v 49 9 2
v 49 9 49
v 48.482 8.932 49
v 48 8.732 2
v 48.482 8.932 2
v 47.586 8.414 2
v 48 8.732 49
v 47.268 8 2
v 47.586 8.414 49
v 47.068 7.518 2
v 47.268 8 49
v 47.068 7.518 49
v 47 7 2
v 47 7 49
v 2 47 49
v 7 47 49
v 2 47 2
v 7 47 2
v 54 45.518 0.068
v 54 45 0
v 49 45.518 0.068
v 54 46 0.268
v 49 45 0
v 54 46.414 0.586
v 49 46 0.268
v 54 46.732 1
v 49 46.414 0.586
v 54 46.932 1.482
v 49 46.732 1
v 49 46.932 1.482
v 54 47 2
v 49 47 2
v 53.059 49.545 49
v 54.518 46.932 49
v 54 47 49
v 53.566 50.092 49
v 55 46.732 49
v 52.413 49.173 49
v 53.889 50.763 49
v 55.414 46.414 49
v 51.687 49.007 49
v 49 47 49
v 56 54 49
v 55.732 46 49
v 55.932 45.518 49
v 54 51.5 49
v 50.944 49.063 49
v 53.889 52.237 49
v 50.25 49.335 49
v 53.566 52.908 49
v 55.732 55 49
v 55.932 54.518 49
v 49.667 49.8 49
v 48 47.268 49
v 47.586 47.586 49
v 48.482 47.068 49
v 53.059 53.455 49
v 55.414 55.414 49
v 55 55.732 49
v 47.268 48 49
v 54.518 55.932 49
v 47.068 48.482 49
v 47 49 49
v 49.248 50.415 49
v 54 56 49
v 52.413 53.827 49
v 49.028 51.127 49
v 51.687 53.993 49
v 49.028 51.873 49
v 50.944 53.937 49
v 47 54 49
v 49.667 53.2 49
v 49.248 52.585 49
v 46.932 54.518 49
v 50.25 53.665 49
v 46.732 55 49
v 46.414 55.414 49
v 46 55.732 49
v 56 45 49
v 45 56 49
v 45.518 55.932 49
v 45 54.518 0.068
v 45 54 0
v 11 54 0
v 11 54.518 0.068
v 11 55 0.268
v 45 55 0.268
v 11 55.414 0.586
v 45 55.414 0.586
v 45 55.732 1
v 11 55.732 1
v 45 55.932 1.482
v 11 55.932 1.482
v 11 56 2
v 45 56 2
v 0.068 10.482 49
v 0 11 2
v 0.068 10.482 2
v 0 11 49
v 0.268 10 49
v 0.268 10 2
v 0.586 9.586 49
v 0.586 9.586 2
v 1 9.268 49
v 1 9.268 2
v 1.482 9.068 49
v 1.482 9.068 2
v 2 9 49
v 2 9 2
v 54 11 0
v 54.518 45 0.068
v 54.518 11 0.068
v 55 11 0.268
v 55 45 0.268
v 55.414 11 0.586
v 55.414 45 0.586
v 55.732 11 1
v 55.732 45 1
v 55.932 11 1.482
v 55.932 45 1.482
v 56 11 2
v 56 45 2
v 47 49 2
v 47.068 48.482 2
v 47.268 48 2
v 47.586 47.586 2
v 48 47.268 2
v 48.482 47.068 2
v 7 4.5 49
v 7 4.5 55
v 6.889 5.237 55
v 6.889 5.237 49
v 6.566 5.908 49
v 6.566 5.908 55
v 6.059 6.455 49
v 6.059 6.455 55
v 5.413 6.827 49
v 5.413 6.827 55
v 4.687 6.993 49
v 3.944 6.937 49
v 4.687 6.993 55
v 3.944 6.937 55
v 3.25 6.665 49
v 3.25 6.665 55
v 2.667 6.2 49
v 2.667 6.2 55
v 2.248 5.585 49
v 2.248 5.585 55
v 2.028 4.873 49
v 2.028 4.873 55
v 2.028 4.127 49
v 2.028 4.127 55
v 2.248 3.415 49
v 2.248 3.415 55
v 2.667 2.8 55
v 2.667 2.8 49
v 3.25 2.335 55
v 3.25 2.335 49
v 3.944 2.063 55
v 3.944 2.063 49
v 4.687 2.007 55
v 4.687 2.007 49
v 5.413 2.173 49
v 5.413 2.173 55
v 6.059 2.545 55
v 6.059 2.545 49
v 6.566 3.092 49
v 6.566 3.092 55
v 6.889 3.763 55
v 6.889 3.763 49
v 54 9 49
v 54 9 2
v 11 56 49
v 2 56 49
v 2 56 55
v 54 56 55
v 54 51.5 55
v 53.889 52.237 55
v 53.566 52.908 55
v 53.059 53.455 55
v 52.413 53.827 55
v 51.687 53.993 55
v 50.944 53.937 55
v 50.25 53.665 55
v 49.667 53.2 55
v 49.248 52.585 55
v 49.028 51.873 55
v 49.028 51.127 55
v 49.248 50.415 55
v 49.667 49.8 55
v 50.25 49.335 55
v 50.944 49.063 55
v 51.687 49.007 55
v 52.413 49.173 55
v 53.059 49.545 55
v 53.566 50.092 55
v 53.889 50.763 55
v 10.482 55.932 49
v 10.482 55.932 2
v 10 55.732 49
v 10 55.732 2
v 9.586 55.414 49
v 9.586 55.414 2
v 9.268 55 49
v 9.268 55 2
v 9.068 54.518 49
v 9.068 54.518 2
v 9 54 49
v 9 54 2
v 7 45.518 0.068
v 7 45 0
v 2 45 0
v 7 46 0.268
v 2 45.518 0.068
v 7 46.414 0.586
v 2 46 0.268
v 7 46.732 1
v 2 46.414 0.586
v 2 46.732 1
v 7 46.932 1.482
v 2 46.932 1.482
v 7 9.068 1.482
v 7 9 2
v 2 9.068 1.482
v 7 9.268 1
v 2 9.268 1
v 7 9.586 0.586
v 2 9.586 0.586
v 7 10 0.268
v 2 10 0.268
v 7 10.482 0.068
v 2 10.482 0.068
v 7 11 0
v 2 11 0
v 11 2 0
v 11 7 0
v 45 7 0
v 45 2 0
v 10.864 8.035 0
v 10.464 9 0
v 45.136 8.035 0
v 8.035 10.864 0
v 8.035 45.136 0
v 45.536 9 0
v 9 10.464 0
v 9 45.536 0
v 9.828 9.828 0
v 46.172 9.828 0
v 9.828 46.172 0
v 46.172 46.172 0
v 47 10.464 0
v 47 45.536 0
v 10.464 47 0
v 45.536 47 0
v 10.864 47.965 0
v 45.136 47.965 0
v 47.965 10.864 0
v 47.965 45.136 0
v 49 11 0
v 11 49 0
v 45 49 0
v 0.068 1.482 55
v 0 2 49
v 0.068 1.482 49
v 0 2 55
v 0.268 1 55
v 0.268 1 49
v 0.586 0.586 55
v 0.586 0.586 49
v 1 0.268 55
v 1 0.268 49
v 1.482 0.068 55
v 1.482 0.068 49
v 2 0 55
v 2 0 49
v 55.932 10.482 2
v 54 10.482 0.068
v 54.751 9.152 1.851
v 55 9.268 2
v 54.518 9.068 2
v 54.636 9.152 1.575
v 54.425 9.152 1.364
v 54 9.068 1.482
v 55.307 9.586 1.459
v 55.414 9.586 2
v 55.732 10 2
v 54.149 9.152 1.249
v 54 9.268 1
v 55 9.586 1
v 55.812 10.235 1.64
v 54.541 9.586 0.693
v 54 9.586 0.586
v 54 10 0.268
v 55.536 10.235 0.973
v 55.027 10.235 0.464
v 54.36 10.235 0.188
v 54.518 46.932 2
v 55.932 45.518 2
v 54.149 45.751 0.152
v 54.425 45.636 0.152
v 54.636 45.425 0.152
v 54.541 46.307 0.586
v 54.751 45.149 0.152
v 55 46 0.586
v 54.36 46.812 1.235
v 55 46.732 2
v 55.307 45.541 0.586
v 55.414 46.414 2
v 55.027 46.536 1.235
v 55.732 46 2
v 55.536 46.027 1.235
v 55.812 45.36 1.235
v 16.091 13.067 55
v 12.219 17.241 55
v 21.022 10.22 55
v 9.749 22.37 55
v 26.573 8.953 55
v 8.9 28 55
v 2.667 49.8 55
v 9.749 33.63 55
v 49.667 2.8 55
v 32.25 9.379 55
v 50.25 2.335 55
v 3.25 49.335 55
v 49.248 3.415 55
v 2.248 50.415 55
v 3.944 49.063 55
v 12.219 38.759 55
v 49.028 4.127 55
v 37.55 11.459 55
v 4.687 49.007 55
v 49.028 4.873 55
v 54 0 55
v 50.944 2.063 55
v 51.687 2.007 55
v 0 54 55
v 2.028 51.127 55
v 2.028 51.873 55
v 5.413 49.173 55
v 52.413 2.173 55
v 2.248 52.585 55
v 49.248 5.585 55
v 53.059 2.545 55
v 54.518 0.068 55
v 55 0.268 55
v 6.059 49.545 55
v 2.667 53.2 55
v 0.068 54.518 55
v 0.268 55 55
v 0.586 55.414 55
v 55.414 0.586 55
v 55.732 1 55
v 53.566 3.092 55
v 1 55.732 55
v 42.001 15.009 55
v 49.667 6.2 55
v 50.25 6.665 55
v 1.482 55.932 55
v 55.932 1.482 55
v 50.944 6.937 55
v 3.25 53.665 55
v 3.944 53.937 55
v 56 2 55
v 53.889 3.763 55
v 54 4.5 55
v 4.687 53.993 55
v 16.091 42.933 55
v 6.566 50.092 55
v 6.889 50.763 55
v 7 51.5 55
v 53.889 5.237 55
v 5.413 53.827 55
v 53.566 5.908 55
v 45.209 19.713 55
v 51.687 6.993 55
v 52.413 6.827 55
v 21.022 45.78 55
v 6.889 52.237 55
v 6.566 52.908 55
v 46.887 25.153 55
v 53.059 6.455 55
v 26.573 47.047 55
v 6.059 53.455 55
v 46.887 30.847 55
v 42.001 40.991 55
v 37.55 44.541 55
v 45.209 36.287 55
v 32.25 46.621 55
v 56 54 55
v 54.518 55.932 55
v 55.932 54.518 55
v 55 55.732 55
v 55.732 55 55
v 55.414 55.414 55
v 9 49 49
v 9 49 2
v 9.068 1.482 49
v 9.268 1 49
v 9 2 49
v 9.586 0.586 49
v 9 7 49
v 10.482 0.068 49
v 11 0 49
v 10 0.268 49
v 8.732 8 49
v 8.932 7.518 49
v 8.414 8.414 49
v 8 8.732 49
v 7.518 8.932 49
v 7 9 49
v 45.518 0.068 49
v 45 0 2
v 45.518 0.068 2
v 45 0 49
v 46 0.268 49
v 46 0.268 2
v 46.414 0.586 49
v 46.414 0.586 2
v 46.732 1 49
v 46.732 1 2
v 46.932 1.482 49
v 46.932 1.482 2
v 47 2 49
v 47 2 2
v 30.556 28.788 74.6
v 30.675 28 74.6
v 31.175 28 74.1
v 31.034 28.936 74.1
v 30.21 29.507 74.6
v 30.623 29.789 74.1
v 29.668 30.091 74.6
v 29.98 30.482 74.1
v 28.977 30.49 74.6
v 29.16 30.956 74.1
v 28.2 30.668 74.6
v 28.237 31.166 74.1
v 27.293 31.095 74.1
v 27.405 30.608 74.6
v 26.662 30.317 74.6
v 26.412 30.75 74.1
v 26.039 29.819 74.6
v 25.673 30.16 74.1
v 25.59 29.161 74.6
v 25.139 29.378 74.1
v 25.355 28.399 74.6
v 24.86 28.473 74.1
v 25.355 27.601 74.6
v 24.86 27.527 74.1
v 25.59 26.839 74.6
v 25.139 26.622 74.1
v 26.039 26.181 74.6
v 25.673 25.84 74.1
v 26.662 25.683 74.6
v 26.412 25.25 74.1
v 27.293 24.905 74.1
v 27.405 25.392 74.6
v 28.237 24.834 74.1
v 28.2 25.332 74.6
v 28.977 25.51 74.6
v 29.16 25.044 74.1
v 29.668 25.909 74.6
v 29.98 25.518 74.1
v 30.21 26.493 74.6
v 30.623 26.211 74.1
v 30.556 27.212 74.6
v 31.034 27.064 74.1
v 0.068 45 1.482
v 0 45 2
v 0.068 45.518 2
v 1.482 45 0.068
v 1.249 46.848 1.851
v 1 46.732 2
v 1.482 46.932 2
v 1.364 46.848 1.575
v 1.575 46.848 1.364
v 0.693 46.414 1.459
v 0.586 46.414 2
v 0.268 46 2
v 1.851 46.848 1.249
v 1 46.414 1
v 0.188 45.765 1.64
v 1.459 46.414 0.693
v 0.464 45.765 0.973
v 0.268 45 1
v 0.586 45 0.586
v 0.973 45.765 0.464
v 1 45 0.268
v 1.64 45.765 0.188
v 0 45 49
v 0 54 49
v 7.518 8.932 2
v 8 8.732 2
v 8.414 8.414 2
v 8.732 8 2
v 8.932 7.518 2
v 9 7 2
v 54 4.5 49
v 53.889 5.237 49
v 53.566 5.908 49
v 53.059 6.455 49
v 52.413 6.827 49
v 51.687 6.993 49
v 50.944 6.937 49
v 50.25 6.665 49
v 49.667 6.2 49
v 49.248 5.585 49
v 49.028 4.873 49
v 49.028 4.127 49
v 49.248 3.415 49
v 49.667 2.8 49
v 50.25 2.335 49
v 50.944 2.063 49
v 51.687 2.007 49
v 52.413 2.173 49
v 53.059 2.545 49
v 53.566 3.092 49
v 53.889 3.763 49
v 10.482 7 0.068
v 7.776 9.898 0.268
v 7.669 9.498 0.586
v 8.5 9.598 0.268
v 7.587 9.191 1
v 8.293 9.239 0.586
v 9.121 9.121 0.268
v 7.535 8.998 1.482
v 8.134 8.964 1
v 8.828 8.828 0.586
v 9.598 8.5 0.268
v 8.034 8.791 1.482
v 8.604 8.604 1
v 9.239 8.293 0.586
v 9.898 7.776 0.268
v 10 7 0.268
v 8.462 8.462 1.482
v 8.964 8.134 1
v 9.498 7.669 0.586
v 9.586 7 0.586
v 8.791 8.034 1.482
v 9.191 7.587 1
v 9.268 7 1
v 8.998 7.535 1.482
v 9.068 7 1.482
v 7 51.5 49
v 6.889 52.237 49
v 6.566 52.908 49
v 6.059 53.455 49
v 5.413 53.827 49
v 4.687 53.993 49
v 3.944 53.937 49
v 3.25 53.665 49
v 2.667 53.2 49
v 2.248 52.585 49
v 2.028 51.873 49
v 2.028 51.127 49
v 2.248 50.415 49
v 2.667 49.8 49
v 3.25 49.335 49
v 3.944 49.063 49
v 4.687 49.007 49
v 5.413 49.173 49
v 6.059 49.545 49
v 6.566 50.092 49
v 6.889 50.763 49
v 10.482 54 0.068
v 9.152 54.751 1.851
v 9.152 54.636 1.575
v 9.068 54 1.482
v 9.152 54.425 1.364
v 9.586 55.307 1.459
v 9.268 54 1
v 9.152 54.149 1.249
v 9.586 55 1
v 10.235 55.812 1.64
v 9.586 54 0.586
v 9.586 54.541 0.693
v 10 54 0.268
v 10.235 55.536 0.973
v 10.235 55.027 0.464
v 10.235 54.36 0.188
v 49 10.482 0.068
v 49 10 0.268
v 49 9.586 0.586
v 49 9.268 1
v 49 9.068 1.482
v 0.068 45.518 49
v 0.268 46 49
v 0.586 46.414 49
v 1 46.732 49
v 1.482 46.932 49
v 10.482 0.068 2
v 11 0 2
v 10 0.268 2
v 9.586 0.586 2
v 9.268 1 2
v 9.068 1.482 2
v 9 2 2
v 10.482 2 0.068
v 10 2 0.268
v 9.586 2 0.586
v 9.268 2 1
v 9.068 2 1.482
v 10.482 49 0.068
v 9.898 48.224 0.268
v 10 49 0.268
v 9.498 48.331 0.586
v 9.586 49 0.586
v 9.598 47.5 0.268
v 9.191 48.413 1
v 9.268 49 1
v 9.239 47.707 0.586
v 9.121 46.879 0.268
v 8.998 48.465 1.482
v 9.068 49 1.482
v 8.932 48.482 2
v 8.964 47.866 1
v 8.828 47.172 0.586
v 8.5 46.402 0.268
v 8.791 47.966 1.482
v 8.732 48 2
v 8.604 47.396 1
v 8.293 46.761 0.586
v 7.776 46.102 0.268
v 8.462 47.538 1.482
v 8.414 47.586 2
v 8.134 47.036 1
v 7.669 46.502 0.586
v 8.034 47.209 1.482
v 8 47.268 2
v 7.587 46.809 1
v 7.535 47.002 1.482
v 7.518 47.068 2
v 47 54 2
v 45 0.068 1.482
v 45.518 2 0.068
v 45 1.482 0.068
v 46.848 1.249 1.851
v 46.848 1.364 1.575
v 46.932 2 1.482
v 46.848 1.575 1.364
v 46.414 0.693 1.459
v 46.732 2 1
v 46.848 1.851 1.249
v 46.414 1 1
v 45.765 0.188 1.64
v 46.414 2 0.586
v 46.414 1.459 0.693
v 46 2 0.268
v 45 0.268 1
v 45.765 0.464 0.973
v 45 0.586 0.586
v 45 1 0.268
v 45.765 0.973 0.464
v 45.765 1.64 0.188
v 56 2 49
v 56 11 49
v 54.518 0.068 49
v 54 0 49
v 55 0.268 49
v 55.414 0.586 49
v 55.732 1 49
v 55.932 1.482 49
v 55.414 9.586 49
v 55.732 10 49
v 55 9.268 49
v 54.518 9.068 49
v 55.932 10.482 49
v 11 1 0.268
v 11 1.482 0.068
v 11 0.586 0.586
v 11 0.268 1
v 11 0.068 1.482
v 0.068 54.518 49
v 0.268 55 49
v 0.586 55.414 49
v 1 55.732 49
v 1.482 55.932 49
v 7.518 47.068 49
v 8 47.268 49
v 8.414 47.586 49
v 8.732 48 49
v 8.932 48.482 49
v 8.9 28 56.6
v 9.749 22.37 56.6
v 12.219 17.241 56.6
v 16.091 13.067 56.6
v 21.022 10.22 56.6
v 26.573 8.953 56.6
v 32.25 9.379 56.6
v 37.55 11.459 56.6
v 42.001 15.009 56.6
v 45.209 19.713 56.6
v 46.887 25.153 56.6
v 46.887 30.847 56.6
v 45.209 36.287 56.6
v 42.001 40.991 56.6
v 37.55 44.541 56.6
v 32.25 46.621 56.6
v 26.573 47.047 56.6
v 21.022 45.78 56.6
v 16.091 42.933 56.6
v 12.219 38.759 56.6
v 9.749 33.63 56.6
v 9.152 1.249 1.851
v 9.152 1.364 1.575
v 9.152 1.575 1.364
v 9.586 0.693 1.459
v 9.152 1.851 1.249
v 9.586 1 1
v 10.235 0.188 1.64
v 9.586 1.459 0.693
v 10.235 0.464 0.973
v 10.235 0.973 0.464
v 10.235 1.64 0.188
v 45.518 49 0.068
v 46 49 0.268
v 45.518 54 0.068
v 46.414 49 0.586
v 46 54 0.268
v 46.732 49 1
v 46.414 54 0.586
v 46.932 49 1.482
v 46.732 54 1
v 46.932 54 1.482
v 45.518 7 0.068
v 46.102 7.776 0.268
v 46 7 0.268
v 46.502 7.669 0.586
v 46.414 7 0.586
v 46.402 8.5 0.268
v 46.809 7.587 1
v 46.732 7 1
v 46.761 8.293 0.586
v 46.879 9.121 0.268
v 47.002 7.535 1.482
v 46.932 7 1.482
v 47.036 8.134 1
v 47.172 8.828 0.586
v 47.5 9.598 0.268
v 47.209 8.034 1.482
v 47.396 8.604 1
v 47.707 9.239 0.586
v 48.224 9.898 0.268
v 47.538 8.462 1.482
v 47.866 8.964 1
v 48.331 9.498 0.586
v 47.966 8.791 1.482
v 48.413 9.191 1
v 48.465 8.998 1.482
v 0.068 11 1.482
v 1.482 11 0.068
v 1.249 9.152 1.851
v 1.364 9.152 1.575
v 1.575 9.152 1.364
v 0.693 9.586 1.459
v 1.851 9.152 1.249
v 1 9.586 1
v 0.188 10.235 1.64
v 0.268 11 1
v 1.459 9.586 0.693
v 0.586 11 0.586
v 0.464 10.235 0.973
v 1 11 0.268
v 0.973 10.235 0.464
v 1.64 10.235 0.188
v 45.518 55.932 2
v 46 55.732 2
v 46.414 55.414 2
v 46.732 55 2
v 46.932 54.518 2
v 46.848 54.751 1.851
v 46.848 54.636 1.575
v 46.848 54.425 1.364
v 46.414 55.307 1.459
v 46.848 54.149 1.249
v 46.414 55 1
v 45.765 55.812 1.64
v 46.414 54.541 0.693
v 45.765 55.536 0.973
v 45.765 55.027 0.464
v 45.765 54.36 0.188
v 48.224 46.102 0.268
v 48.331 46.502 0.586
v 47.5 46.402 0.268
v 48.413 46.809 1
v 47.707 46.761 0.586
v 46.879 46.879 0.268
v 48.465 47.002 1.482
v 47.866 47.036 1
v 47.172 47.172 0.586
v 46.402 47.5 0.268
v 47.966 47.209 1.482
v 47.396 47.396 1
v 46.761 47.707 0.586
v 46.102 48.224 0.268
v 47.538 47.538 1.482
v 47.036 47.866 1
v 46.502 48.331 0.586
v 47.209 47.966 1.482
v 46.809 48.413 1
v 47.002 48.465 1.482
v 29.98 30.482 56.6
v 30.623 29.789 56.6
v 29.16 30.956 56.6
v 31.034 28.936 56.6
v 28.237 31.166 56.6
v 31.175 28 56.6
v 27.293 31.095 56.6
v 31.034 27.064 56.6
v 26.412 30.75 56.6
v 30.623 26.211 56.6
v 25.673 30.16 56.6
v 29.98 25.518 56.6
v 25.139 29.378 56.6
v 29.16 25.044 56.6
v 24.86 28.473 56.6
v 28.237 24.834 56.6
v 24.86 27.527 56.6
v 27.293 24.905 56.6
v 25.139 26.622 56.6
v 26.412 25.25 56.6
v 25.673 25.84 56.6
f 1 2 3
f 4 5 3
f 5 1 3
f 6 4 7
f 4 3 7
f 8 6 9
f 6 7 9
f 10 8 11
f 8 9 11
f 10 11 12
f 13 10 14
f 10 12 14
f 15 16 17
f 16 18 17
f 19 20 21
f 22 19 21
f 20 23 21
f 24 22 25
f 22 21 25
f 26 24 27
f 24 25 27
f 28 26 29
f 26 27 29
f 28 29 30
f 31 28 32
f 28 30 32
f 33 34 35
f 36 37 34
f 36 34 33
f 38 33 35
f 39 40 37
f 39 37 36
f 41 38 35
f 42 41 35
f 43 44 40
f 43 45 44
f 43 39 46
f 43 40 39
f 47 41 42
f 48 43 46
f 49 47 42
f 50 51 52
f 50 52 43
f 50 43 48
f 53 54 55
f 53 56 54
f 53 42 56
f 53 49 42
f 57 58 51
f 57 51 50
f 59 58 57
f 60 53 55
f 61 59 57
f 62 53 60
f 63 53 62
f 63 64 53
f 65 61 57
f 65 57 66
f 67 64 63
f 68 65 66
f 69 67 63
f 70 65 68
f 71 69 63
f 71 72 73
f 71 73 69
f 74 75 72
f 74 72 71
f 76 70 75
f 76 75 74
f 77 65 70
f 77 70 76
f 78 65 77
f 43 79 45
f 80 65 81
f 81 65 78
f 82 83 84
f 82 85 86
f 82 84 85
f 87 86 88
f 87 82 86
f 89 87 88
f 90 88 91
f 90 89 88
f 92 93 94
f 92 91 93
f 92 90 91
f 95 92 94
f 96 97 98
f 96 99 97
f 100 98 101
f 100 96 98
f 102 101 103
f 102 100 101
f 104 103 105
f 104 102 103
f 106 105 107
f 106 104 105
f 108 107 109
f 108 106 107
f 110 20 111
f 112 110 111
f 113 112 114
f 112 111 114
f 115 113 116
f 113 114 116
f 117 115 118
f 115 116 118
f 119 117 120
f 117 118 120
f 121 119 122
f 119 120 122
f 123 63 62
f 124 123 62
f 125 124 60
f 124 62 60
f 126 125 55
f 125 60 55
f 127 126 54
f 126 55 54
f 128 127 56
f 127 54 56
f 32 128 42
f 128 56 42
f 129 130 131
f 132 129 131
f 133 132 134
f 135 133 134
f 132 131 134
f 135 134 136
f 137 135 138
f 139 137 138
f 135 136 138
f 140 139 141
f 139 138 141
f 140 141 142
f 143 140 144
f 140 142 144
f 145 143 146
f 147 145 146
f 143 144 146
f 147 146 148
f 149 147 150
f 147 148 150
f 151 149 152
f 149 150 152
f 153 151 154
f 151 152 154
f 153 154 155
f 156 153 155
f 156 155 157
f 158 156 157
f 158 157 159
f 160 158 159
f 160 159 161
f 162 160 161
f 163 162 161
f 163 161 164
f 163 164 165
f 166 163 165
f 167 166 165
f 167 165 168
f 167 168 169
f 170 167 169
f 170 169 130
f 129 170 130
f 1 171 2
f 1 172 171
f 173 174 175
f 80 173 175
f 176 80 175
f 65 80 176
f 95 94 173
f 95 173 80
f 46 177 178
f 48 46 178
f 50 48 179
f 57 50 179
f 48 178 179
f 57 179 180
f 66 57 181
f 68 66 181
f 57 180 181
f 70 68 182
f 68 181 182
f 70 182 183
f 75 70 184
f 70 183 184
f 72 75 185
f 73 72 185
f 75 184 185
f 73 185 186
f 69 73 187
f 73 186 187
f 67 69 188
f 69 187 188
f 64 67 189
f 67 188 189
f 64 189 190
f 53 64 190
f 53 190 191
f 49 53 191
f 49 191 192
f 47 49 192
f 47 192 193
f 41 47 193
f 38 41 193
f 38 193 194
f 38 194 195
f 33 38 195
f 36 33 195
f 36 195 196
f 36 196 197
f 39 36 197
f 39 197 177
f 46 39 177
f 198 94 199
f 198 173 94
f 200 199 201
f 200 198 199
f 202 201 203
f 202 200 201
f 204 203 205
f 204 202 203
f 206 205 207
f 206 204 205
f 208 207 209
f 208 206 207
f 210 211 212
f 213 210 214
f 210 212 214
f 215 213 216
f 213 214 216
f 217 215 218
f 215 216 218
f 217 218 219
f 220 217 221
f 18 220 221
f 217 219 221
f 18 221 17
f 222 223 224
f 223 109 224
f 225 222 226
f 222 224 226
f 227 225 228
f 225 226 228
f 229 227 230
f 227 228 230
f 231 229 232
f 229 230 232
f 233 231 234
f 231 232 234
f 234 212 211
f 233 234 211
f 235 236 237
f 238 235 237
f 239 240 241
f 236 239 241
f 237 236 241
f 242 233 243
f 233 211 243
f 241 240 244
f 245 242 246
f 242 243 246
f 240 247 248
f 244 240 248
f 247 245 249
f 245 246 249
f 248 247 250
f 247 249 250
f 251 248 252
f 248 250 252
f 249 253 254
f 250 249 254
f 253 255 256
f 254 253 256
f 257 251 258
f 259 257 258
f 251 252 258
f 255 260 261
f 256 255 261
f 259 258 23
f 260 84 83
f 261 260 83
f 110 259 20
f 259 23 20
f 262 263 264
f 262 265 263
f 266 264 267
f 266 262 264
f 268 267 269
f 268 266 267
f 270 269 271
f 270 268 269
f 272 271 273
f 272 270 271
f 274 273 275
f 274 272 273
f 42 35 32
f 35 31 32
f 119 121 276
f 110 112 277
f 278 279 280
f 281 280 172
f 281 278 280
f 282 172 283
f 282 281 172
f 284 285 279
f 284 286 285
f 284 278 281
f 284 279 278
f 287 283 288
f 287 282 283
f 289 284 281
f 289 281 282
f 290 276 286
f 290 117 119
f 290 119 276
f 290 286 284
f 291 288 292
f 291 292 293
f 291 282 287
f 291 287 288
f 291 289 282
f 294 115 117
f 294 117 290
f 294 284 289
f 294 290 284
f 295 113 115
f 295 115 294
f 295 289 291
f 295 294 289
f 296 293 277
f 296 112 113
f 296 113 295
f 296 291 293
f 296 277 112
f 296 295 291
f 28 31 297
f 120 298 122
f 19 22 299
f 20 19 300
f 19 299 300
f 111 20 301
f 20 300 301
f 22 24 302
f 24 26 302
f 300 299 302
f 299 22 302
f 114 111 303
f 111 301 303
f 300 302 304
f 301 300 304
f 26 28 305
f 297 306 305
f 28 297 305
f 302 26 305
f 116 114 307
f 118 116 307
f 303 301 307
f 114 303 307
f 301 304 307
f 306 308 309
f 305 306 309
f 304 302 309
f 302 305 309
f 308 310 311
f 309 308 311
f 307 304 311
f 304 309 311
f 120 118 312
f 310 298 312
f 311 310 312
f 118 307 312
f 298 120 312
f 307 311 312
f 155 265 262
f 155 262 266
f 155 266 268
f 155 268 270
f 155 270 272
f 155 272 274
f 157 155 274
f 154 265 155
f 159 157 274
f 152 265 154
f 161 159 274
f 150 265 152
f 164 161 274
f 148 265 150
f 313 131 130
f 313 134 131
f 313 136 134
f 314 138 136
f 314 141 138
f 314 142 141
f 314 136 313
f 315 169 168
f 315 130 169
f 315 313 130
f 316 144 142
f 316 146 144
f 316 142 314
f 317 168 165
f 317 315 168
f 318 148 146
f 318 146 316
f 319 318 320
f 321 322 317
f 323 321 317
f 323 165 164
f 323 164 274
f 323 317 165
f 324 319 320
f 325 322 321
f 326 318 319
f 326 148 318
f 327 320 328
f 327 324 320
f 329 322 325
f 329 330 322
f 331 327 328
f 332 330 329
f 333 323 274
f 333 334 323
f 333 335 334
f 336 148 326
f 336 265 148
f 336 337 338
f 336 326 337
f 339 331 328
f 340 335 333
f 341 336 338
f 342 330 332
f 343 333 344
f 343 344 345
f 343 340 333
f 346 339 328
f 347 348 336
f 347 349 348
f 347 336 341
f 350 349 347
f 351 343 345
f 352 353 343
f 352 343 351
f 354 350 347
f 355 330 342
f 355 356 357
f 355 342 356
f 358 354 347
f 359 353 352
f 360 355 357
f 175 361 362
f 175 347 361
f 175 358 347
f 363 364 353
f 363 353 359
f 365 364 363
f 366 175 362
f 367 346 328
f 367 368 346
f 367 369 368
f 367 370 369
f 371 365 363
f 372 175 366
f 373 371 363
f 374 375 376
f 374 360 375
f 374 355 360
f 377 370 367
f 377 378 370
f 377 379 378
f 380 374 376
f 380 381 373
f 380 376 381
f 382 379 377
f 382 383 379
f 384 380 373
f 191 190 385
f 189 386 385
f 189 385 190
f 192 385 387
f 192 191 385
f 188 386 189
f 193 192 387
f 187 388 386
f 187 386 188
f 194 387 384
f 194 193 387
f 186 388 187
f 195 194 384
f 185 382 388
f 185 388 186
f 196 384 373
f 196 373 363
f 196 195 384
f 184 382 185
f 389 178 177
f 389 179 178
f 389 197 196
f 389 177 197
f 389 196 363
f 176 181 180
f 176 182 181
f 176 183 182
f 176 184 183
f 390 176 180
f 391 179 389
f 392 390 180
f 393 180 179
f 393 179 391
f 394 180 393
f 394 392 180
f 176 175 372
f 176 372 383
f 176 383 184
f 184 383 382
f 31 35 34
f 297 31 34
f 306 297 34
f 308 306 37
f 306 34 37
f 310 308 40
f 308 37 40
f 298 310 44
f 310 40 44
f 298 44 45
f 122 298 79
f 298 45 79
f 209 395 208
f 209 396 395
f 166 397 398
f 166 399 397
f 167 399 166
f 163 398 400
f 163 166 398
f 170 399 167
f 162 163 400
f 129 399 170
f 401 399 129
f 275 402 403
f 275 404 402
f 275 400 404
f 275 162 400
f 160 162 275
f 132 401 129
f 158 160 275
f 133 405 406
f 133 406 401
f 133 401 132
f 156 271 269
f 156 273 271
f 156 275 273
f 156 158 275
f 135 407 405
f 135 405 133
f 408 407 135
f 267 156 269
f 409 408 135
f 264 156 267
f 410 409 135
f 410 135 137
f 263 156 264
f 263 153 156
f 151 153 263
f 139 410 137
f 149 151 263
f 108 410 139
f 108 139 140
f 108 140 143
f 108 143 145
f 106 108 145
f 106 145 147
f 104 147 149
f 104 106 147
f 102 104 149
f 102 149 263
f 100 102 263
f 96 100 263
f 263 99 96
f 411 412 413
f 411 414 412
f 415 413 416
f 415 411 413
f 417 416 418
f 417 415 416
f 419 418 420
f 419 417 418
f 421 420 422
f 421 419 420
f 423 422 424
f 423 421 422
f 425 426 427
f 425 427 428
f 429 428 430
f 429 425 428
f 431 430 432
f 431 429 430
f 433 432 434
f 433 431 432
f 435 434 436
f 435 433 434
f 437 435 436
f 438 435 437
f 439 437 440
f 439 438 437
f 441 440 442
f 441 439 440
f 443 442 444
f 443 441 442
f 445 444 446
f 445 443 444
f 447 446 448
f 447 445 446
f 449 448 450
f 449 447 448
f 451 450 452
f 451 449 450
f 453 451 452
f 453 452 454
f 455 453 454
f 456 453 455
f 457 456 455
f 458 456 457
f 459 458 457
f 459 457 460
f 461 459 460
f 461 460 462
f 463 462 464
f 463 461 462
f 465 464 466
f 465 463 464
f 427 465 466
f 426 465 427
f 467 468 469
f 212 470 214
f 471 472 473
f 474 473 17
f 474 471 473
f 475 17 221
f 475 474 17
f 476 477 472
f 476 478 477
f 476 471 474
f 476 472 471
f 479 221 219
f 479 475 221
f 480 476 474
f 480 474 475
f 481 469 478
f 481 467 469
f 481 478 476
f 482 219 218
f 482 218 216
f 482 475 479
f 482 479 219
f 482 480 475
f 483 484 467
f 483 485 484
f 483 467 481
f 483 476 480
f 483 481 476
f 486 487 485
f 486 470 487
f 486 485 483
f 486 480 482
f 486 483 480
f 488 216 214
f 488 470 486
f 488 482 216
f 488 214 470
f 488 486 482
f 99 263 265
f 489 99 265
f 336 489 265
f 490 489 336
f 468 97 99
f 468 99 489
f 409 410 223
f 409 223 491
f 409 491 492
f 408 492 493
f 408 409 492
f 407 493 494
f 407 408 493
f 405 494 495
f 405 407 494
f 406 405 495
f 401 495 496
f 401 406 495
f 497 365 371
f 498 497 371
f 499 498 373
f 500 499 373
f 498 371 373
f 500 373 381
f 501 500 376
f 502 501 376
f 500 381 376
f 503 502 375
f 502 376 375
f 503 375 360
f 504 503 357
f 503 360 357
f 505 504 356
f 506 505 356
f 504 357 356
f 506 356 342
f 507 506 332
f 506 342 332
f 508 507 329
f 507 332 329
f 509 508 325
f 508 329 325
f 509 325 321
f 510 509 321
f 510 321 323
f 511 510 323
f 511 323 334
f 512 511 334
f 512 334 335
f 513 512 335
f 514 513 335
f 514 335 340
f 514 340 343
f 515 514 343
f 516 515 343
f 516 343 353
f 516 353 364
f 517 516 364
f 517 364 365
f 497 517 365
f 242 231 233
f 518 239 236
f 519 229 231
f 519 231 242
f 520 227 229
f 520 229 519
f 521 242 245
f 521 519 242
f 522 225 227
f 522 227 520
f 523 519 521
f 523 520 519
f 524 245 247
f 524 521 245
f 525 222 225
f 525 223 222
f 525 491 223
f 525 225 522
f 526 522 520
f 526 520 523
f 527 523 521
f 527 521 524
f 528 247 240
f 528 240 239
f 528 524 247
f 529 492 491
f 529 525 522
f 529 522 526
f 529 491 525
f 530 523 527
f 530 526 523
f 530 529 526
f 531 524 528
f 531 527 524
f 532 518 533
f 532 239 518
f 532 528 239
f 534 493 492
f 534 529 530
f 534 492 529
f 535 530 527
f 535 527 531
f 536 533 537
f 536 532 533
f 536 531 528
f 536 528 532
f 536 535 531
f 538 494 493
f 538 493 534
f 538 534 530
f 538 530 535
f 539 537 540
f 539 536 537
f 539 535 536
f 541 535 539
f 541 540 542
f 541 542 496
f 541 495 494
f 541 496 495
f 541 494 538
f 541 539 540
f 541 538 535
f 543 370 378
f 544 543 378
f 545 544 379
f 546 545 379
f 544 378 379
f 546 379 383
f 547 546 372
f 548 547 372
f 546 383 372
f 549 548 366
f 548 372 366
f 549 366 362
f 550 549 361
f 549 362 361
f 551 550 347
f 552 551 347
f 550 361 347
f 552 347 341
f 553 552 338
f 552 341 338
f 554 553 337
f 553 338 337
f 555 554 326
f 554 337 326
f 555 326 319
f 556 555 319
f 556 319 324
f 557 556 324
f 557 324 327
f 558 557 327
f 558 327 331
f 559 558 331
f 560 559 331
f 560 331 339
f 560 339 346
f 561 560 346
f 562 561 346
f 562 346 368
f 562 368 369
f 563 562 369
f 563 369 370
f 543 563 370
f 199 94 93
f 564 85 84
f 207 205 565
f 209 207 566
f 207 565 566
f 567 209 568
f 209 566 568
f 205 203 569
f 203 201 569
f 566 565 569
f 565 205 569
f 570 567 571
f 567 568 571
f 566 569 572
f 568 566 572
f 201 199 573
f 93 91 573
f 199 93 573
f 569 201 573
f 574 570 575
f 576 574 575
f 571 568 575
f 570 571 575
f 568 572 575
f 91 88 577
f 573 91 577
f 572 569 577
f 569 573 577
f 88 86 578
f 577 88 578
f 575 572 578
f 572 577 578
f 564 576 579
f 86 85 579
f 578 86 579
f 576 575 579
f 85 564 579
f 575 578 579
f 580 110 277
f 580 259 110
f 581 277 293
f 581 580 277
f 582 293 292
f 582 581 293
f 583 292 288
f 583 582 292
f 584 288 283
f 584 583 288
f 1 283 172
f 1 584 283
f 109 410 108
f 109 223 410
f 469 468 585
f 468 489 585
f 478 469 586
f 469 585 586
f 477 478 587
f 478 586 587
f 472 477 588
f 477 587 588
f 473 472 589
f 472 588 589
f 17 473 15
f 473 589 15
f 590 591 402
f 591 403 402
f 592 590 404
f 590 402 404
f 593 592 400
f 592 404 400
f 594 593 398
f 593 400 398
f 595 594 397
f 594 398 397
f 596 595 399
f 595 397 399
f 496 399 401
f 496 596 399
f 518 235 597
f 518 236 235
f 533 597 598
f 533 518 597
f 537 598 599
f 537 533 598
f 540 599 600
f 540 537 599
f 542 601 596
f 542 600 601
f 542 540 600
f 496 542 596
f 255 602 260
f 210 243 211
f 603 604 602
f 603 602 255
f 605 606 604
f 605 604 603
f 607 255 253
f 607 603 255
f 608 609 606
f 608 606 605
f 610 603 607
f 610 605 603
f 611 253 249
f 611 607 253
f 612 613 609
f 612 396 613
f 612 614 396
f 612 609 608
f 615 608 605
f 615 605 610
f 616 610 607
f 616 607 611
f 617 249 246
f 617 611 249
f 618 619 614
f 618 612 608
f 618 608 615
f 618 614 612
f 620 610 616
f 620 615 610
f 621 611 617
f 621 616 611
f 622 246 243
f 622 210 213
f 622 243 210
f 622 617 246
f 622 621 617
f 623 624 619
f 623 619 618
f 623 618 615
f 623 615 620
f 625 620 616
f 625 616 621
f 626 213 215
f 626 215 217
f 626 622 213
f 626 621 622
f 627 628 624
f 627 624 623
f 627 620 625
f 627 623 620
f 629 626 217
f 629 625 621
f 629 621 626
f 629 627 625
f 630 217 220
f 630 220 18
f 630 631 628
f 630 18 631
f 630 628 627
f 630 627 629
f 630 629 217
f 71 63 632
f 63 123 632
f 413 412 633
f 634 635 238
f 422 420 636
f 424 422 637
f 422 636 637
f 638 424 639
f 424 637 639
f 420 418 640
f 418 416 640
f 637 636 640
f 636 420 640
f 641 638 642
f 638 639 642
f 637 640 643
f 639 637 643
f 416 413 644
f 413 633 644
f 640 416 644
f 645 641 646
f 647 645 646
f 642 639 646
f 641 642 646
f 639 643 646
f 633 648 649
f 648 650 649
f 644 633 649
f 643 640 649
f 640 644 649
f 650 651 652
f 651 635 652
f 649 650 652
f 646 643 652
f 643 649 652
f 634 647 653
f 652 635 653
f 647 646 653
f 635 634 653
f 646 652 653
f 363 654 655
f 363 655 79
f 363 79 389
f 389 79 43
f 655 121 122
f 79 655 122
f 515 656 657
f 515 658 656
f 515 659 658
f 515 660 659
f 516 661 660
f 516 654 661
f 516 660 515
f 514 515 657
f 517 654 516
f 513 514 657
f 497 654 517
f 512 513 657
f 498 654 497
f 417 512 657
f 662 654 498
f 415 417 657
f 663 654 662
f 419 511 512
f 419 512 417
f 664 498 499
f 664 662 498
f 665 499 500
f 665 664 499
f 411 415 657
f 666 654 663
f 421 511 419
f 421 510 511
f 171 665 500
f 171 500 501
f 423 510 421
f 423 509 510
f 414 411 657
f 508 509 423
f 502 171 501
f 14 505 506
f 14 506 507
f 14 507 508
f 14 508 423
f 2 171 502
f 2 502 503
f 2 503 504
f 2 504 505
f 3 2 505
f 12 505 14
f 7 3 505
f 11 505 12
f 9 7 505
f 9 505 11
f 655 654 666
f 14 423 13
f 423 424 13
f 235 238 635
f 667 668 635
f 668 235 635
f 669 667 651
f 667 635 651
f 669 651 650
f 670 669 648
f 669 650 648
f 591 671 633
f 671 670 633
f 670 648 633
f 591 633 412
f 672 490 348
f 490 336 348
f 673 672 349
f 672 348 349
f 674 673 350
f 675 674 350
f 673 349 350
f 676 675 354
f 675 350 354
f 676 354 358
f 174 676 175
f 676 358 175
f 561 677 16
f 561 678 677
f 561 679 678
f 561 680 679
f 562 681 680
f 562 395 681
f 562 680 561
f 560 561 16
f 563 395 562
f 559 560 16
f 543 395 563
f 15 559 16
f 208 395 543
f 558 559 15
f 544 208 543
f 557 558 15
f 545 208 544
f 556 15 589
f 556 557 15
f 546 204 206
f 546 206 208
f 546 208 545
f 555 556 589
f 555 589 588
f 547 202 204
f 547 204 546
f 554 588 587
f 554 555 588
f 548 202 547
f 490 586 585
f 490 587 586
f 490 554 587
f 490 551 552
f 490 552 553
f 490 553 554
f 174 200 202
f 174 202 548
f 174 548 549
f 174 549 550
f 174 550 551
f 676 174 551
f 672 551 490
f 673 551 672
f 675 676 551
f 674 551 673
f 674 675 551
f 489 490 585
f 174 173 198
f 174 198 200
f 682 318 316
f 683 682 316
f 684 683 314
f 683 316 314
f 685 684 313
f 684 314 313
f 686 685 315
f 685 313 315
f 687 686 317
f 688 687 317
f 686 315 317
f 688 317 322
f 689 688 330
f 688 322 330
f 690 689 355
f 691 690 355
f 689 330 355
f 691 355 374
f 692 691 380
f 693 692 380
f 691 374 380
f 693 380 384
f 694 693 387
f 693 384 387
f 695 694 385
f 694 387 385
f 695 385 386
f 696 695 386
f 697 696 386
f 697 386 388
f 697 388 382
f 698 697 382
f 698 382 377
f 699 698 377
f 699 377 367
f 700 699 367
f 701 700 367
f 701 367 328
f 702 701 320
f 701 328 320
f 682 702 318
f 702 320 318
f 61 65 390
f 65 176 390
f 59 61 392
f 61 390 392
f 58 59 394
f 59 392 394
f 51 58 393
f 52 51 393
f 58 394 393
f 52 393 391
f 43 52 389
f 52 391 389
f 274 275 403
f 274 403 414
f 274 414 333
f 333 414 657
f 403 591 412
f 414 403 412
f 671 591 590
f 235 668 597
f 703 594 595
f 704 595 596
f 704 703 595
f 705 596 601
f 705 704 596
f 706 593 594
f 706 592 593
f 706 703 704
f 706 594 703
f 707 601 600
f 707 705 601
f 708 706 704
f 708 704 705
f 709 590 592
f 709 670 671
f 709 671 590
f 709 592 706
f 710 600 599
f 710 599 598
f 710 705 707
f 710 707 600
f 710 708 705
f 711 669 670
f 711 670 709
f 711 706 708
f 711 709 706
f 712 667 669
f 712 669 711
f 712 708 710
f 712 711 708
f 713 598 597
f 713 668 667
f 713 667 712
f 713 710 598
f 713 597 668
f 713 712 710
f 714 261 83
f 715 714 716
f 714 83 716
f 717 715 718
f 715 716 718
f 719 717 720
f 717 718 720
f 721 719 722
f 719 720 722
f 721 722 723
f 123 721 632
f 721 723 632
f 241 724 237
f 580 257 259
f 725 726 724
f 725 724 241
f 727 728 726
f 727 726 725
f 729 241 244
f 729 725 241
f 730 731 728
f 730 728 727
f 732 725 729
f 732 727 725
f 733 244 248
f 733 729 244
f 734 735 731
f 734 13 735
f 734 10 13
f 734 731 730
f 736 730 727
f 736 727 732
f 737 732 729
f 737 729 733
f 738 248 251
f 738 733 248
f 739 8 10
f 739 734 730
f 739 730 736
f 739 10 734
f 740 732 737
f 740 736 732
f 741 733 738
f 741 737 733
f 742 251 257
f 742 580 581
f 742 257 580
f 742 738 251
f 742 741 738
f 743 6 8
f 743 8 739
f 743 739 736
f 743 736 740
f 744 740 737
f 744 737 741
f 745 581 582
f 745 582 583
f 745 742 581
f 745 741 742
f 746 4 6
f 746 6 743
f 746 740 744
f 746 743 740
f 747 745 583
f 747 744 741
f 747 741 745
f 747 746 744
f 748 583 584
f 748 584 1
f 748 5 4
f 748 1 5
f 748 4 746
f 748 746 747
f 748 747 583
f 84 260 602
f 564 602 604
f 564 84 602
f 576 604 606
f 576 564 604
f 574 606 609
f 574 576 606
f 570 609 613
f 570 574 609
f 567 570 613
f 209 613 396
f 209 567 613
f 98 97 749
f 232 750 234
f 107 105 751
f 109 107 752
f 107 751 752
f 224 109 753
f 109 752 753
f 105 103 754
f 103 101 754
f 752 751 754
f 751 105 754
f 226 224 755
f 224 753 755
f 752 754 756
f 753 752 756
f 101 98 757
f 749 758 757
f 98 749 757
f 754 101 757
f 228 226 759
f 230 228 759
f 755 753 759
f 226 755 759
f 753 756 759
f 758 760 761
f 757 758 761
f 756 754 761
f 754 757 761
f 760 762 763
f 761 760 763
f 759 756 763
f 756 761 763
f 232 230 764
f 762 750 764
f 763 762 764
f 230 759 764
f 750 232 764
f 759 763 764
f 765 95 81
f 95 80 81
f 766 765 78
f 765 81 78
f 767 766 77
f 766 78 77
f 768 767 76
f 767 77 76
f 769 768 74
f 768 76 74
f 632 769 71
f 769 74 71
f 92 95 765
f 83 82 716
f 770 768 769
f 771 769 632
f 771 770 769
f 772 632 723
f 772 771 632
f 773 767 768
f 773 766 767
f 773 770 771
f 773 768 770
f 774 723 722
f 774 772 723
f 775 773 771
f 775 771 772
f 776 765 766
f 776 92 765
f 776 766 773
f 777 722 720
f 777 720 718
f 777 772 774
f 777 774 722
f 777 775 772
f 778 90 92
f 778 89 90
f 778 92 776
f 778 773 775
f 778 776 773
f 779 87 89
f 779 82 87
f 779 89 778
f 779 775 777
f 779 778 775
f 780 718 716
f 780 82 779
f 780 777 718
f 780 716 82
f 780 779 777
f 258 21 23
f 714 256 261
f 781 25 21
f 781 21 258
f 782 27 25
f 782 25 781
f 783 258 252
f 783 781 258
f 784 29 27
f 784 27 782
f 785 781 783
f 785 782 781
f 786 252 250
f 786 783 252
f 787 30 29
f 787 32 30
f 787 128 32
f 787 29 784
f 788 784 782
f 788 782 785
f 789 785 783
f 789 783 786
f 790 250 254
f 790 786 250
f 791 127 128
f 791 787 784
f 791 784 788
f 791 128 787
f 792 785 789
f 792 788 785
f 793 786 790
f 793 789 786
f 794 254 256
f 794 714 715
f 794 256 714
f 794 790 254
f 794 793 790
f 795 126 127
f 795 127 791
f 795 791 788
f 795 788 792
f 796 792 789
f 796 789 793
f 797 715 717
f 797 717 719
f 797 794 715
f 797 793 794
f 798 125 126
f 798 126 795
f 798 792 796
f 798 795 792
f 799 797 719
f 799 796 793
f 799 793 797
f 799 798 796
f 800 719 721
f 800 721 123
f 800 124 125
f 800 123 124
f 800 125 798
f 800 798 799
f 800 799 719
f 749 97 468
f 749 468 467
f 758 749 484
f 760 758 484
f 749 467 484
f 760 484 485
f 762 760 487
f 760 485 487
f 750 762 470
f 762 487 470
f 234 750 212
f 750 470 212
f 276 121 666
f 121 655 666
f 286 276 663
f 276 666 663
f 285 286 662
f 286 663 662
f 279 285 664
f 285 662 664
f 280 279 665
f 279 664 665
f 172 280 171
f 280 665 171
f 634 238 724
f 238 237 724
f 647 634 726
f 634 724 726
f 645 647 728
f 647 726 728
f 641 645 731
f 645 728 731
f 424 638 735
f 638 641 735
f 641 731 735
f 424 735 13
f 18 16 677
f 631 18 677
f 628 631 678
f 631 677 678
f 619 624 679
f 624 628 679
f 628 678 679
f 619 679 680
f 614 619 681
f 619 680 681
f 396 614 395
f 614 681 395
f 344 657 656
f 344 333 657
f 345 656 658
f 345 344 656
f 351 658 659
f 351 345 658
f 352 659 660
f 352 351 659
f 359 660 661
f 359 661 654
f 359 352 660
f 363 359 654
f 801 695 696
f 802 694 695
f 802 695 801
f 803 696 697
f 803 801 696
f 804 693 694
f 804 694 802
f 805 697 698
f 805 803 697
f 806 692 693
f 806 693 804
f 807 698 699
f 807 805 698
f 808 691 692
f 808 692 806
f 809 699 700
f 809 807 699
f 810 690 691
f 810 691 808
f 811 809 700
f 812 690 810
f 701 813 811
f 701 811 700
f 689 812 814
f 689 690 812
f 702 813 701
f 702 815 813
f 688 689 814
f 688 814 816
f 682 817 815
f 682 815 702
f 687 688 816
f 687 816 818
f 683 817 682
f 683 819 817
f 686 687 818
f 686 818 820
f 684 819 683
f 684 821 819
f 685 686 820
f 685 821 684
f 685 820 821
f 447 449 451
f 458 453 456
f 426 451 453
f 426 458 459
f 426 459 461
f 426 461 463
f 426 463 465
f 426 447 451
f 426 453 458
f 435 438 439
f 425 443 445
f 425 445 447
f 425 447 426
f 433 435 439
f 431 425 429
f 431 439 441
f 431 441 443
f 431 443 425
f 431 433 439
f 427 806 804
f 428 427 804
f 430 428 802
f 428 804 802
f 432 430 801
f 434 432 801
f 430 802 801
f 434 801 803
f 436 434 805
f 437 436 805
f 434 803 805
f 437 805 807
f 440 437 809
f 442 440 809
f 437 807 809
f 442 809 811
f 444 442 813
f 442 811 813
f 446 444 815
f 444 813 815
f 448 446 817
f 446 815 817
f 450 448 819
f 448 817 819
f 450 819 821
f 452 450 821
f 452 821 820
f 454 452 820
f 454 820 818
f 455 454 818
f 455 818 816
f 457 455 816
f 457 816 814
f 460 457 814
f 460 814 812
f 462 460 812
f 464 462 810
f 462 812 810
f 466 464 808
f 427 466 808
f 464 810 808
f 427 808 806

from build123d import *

# Parameters (mm, degrees)
SKETCH_1_W          = 56
SKETCH_1_H          = 56
EXTRUDE_1_DEPTH     = 55
SKETCH_2_W          = 9
SKETCH_2_H          = 9
CUT_EXTRUDE_1_DEPTH = 49
FILLET_1_R          = 2
SKETCH_3_R          = 19.1
EXTRUDE_2_DEPTH     = 1.6
SKETCH_4_R          = 3.175
EXTRUDE_3_DEPTH     = 18
SKETCH_5_R          = 2.5
CUT_EXTRUDE_2_DEPTH = 18
CHAMFER_1_SIZE      = 0.5


with BuildPart() as part:
    # Эскиз1 → Вытянуть1 (new body)
    with BuildSketch(Plane.XY):
        with Locations((28, 28)):
            Rectangle(SKETCH_1_W, SKETCH_1_H)
    extrude(amount=EXTRUDE_1_DEPTH)

    # Эскиз2 → Вырез-Вытянуть1 (cut)
    with BuildSketch(Plane(origin=(0, 0, 0), x_dir=(-1, 0, 0), z_dir=(0, 0, -1))):
        with Locations((-51.5, 51.5)):
            Rectangle(SKETCH_2_W, SKETCH_2_H)
        with Locations((-4.5, 51.5)):
            Rectangle(SKETCH_2_W, SKETCH_2_H)
        with Locations((-4.5, 4.5)):
            Rectangle(SKETCH_2_W, SKETCH_2_H)
        with Locations((-51.5, 4.5)):
            Rectangle(SKETCH_2_W, SKETCH_2_H)
    extrude(amount=-CUT_EXTRUDE_1_DEPTH, mode=Mode.SUBTRACT)

    # Скругление1
    fillet_1_edges = [part.edges().sort_by_distance(p)[0] for p in [
        (28, 56, 0),
        (56, 47, 24.5),
        (47, 56, 24.5),
        (47, 47, 24.5),
        (51.5, 47, 0),
        (47, 51.5, 0),
        (0, 28, 0),
        (9, 56, 24.5),
        (0, 47, 24.5),
        (9, 47, 24.5),
        (9, 51.5, 0),
        (4.5, 47, 0),
        (28, 0, 0),
        (0, 9, 24.5),
        (9, 0, 24.5),
        (9, 9, 24.5),
        (4.5, 9, 0),
        (9, 4.5, 0),
        (56, 28, 0),
        (47, 0, 24.5),
        (56, 9, 24.5),
        (47, 9, 24.5),
        (47, 4.5, 0),
        (51.5, 9, 0),
        (0, 56, 52),
        (56, 56, 52),
        (56, 0, 52),
        (0, 0, 52),
    ]]
    fillet(fillet_1_edges, radius=FILLET_1_R)

    # Эскиз3 → Вытянуть2 (add)
    with BuildSketch(Plane.XY.offset(55)):
        with Locations(Location((28, 28, 0), (0, 0, 180))):
            Circle(SKETCH_3_R)
    extrude(amount=EXTRUDE_2_DEPTH)

    # Эскиз4 → Вытянуть3 (add)
    with BuildSketch(Plane.XY.offset(56.6)):
        with Locations((28, 28)):
            Circle(SKETCH_4_R)
    extrude(amount=EXTRUDE_3_DEPTH)

    # Эскиз5 → Вырез-Вытянуть2 (cut)
    with BuildSketch(Plane.XY.offset(55)):
        with Locations((4.5, 51.5)):
            Circle(SKETCH_5_R)
        with Locations((51.5, 51.5)):
            Circle(SKETCH_5_R)
        with Locations((4.5, 4.5)):
            Circle(SKETCH_5_R)
        with Locations((51.5, 4.5)):
            Circle(SKETCH_5_R)
    extrude(amount=-CUT_EXTRUDE_2_DEPTH, mode=Mode.SUBTRACT)

    # Фаска1
    chamfer_1_edges = [part.edges().sort_by_distance(p)[0] for p in [
        (24.825, 28, 74.6),
    ]]
    chamfer(chamfer_1_edges, length=CHAMFER_1_SIZE)


solid = part.part
